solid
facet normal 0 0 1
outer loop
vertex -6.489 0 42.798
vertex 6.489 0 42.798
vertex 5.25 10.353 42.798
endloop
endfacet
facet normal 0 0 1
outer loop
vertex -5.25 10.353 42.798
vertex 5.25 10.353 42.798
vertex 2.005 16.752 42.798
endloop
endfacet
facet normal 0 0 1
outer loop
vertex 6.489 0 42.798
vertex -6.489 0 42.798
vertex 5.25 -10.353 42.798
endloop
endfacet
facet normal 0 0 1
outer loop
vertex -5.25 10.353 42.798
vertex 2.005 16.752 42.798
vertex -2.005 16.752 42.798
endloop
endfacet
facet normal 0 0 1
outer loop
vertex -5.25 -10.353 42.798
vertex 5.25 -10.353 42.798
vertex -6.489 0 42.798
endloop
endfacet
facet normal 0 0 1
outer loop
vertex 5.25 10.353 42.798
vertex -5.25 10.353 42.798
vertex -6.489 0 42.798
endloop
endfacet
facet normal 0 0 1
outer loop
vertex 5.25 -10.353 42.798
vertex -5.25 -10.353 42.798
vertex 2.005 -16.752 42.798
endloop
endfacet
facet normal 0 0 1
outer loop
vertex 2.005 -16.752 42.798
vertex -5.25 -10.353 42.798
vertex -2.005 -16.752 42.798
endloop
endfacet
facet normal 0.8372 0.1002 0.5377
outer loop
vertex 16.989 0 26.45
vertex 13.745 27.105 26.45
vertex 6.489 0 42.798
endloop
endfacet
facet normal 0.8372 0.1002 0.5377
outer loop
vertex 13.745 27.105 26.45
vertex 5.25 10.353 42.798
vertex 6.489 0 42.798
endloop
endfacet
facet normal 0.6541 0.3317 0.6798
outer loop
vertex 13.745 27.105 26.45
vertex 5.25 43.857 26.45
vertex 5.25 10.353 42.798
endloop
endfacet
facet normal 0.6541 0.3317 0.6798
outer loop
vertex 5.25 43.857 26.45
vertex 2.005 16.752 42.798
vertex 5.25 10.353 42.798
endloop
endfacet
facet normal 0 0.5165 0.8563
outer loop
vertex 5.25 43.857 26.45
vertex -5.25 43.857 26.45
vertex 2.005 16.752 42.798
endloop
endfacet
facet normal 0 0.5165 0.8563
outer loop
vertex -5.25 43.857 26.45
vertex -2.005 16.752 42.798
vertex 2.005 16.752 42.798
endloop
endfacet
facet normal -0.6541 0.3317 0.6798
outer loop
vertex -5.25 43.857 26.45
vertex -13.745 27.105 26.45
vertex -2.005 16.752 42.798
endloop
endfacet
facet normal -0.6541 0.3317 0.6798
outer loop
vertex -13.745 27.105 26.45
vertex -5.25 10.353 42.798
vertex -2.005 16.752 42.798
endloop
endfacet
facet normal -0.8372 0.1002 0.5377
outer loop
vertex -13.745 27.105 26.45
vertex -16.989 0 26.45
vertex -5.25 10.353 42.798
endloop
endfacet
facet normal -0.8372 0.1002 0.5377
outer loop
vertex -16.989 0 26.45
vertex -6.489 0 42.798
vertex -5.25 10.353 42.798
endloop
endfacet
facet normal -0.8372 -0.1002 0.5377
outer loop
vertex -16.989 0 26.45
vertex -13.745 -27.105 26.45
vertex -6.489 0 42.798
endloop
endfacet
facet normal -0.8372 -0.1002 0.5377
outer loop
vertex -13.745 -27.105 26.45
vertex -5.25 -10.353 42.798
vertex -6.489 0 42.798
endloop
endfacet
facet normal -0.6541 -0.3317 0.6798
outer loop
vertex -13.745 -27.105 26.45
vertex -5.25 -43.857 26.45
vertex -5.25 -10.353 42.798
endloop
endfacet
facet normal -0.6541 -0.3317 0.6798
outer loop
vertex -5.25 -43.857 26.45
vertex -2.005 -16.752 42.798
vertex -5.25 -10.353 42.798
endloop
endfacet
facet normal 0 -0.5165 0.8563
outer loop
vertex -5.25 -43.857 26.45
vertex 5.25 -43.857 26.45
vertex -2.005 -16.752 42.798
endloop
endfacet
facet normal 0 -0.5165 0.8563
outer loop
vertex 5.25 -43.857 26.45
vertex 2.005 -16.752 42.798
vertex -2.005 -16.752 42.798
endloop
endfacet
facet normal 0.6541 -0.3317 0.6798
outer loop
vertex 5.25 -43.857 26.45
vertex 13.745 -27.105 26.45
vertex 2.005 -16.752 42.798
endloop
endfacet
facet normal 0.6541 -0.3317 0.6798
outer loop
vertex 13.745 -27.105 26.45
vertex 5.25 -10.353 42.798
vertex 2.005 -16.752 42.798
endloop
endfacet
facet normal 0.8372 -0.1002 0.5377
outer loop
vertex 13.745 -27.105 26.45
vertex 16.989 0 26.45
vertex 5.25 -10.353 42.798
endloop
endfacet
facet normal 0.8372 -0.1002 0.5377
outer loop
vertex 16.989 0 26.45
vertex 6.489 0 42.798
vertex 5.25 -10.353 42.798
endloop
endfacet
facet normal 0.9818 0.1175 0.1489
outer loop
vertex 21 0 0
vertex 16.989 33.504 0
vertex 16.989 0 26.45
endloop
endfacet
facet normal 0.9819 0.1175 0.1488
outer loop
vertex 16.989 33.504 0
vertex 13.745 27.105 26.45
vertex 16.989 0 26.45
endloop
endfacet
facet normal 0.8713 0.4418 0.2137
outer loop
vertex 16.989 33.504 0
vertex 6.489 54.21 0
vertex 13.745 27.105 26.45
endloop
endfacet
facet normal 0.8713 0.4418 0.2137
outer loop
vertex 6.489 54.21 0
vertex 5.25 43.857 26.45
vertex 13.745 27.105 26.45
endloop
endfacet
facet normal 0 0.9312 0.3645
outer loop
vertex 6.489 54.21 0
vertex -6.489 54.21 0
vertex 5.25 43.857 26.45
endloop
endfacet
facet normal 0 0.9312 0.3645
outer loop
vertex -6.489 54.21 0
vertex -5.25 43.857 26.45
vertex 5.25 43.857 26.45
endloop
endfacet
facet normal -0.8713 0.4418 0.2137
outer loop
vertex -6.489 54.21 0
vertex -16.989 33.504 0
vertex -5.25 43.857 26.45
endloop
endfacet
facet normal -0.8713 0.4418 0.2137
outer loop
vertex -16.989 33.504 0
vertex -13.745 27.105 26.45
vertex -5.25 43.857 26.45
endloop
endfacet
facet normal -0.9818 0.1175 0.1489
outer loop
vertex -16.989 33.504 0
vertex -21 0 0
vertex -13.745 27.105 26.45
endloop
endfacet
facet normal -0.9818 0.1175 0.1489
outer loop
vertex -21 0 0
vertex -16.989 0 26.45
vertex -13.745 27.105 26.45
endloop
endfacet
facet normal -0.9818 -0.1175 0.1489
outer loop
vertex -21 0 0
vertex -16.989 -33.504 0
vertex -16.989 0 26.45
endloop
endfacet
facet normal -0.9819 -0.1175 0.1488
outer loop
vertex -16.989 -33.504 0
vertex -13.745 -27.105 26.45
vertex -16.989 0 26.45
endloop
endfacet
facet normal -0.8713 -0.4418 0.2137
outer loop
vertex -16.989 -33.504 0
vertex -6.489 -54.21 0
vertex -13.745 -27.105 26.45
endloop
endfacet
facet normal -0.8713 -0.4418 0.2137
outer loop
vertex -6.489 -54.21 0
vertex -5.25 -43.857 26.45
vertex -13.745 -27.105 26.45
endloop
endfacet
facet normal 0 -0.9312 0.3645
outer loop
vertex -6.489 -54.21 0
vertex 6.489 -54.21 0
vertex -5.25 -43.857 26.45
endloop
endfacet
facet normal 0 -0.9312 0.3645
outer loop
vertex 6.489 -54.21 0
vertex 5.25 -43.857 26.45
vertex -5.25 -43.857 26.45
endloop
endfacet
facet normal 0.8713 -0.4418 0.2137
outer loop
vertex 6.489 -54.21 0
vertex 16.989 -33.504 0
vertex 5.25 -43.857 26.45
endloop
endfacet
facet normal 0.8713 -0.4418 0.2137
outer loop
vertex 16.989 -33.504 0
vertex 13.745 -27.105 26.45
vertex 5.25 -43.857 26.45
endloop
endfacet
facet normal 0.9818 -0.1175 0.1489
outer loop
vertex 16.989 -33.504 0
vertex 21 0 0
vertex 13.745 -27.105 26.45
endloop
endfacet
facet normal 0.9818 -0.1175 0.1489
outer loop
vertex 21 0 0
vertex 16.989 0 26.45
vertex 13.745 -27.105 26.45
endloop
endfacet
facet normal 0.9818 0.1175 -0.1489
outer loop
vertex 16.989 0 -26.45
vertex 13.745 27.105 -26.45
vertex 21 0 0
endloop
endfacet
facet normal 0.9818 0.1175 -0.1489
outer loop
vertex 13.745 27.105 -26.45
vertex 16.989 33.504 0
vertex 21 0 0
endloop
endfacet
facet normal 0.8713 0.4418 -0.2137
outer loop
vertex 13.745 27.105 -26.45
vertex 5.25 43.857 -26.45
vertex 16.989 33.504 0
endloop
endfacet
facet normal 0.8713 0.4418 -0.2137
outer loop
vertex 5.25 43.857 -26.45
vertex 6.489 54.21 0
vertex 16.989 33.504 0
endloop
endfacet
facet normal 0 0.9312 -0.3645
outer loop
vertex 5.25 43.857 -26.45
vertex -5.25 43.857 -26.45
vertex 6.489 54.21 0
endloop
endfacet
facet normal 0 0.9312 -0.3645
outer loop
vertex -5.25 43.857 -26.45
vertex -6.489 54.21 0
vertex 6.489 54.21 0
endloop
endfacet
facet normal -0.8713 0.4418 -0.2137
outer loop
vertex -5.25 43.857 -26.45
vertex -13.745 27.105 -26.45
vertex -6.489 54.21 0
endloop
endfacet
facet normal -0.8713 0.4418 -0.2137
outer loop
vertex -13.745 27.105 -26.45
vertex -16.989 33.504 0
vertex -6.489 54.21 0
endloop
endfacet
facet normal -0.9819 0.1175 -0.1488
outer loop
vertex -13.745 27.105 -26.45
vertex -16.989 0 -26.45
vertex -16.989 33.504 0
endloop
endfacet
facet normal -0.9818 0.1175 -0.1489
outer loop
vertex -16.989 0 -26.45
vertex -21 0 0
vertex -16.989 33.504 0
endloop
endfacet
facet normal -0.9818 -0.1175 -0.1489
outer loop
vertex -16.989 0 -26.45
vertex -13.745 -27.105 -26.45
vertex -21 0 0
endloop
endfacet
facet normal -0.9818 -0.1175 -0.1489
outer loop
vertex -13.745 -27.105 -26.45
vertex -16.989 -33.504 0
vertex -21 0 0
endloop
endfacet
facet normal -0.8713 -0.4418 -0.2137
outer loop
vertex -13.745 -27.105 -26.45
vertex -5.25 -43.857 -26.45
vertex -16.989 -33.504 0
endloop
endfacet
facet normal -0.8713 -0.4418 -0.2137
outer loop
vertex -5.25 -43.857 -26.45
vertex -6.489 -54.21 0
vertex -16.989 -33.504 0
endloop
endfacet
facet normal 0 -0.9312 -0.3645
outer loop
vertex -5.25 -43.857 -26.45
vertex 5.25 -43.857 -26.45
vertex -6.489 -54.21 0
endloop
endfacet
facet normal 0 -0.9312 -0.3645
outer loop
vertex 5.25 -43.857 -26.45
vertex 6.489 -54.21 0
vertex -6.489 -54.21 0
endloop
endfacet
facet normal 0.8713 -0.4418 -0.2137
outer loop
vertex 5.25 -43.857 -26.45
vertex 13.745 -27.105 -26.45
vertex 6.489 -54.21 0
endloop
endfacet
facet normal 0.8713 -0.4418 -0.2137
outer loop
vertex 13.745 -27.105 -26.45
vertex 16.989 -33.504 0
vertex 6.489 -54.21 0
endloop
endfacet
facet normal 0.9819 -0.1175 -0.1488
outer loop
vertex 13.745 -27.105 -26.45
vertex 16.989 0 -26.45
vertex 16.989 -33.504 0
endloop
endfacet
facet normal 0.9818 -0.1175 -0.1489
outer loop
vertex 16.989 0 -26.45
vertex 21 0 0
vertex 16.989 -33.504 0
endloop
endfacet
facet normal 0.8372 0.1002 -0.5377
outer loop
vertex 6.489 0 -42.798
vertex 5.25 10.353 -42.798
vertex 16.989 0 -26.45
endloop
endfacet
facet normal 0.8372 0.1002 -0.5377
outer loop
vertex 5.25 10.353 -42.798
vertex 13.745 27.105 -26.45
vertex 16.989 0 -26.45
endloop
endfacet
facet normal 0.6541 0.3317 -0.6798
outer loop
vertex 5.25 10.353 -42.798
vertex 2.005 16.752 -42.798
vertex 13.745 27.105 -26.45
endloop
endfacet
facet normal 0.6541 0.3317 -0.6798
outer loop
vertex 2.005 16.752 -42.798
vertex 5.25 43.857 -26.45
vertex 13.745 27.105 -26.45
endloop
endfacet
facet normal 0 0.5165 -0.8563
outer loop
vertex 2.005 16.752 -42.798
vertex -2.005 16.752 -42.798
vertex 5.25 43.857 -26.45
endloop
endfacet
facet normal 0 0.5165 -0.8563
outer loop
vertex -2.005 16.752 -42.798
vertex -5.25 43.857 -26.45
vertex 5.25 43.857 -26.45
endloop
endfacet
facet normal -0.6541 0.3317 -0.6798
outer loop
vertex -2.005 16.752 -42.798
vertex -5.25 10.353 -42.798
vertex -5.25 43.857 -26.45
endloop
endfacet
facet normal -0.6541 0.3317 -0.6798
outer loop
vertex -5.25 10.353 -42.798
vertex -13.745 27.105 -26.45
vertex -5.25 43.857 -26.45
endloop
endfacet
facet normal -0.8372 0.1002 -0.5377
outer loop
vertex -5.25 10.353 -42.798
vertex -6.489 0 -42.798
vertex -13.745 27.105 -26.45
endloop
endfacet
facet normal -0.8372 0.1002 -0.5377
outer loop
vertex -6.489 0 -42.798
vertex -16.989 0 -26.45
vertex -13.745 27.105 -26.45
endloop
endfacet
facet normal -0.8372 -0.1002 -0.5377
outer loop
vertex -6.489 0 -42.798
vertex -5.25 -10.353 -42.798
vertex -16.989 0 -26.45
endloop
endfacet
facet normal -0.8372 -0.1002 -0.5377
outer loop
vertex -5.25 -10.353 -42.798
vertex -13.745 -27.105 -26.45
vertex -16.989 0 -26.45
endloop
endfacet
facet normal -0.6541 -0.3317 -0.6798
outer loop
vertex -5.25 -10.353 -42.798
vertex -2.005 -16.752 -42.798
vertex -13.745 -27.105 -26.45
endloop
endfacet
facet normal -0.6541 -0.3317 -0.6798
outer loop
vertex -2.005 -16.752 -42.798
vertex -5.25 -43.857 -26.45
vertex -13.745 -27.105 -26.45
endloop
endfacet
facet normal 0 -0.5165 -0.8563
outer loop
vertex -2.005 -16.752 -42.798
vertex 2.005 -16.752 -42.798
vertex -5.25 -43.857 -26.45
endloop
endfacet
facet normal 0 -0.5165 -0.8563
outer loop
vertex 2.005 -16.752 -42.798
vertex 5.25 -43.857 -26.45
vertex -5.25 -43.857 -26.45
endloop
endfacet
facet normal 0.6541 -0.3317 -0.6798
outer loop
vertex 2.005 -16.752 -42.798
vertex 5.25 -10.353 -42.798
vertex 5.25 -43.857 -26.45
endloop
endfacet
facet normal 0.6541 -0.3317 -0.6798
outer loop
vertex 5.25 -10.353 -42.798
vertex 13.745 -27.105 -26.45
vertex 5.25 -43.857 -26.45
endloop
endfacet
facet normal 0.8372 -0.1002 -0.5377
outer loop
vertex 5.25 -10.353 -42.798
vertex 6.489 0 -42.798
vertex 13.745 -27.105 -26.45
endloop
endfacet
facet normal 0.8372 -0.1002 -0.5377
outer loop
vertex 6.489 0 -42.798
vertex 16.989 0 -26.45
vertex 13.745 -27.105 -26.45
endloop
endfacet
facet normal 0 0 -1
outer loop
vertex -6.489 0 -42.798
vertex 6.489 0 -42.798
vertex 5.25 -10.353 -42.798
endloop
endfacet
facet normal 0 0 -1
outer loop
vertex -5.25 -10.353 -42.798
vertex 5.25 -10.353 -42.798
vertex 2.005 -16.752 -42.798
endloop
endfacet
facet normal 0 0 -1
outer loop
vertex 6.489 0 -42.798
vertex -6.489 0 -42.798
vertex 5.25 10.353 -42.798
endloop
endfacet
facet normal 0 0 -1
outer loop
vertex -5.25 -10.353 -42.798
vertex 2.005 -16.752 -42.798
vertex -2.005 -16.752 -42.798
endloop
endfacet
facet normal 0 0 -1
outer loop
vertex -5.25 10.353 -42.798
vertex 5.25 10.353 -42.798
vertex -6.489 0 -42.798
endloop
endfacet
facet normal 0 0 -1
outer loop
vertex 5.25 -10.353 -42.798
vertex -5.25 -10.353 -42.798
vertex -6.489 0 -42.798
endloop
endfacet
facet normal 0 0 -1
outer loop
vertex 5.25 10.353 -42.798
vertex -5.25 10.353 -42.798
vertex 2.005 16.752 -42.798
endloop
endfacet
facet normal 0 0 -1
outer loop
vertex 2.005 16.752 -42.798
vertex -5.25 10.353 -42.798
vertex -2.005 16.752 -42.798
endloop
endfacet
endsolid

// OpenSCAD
// Generated by SolidPython 1.0.1 on 2020-07-29 00:46:48


scale(v = [7, 19, 15]) {
	sphere(r = 3);
}
/***********************************************
*********      SolidPython code:      **********
************************************************
 
# import packages: SolidPython
from solid import *
from solid.utils import *
from itertools import chain, combinations, permutations


class Resize:

    def __init__(self, scad_file):
        self.scad_file = scad_file
        #self.scad_file = import_scad(scad_file)
        # cone/cylinder param:
        self.r1 = 0
        self.r2 = 0
        self.h = 0
        # rectangular prism param:
        self.w = 0
        self.l = 0
        # ellipse param:
        self.r = 0

    # import OpenScad code (file name corresponds to shape)


    # classify shape + parameters
    def assign(self, param1, param2, param3):
        if self.scad_file == 'cone.scad':
            self.r1 = param1
            self.r2 = param2
            self.h = param3
        elif self.scad_file == 'cylinder.scad':
            self.r1 = param1
            self.r2 = param2
            self.h = param3
        elif self.scad_file == 'rectangularPrism.scad':
            self.h = param1
            self.l = param2
            self.w = param3
        else:
            self.r = param1
            self.h = param2

    # resize parameters
    def iterate(self):
        x = range(3, 20, 2)
        i = 1
        if self.scad_file == 'cone.scad':
            tempList = list(permutations(x, 2))
            for temp in tempList:
                param1 = temp[0]
                param2 = temp[1]
                filepath = 'produced_scad_files/' + 'cone' + str(param1) + '_' + str(param2) + '_' + '.scad'
                scad_render_to_file(cylinder(h=param1, r1=param2, r2=0), filepath)

        elif self.scad_file == 'cylinder.scad':
            tempList = list(permutations(x, 3))
            for temp in tempList:
                param1 = temp[0]
                param2 = temp[1]
                filepath = 'produced_scad_files/' + 'cylinder' + str(param1) + '_' + str(param2) + '_' + '.scad'
                scad_render_to_file(cylinder(h=param1, r1=param2, r2=param2), filepath)

        elif self.scad_file == 'rectangularPrism.scad':
            tempList = list(permutations(x, 3))
            for temp in tempList:
                param1 = temp[0]
                param2 = temp[1]
                param3 = temp[2]
                filepath = 'produced_scad_files/' + 'rectangularPrism' + str(param1) + '_' + str(param2) + '_' + str(
                    param3) + '.scad'
                scad_render_to_file(cube(size=(param1, param2, param3)), filepath)

        elif self.scad_file == 'ellipse.scad':
            tempList = list(permutations(x, 4))
            for temp in tempList:
                param1 = temp[0]
                param2 = temp[1]
                param3 = temp[2]
                param4 = temp[3]
                filepath = 'produced_scad_files/' + 'ellipse' + str(param1) + '_' + str(param2) + '_' + str(param3) + '_' + str(param4) + '.scad'
                scad_render_to_file(scale([param1, param2, param3])(sphere(r=param4)), filepath)

    def render_to_scadfile(self):
        scad_render_to_file(scad, 'example.scad') 
 
************************************************/
